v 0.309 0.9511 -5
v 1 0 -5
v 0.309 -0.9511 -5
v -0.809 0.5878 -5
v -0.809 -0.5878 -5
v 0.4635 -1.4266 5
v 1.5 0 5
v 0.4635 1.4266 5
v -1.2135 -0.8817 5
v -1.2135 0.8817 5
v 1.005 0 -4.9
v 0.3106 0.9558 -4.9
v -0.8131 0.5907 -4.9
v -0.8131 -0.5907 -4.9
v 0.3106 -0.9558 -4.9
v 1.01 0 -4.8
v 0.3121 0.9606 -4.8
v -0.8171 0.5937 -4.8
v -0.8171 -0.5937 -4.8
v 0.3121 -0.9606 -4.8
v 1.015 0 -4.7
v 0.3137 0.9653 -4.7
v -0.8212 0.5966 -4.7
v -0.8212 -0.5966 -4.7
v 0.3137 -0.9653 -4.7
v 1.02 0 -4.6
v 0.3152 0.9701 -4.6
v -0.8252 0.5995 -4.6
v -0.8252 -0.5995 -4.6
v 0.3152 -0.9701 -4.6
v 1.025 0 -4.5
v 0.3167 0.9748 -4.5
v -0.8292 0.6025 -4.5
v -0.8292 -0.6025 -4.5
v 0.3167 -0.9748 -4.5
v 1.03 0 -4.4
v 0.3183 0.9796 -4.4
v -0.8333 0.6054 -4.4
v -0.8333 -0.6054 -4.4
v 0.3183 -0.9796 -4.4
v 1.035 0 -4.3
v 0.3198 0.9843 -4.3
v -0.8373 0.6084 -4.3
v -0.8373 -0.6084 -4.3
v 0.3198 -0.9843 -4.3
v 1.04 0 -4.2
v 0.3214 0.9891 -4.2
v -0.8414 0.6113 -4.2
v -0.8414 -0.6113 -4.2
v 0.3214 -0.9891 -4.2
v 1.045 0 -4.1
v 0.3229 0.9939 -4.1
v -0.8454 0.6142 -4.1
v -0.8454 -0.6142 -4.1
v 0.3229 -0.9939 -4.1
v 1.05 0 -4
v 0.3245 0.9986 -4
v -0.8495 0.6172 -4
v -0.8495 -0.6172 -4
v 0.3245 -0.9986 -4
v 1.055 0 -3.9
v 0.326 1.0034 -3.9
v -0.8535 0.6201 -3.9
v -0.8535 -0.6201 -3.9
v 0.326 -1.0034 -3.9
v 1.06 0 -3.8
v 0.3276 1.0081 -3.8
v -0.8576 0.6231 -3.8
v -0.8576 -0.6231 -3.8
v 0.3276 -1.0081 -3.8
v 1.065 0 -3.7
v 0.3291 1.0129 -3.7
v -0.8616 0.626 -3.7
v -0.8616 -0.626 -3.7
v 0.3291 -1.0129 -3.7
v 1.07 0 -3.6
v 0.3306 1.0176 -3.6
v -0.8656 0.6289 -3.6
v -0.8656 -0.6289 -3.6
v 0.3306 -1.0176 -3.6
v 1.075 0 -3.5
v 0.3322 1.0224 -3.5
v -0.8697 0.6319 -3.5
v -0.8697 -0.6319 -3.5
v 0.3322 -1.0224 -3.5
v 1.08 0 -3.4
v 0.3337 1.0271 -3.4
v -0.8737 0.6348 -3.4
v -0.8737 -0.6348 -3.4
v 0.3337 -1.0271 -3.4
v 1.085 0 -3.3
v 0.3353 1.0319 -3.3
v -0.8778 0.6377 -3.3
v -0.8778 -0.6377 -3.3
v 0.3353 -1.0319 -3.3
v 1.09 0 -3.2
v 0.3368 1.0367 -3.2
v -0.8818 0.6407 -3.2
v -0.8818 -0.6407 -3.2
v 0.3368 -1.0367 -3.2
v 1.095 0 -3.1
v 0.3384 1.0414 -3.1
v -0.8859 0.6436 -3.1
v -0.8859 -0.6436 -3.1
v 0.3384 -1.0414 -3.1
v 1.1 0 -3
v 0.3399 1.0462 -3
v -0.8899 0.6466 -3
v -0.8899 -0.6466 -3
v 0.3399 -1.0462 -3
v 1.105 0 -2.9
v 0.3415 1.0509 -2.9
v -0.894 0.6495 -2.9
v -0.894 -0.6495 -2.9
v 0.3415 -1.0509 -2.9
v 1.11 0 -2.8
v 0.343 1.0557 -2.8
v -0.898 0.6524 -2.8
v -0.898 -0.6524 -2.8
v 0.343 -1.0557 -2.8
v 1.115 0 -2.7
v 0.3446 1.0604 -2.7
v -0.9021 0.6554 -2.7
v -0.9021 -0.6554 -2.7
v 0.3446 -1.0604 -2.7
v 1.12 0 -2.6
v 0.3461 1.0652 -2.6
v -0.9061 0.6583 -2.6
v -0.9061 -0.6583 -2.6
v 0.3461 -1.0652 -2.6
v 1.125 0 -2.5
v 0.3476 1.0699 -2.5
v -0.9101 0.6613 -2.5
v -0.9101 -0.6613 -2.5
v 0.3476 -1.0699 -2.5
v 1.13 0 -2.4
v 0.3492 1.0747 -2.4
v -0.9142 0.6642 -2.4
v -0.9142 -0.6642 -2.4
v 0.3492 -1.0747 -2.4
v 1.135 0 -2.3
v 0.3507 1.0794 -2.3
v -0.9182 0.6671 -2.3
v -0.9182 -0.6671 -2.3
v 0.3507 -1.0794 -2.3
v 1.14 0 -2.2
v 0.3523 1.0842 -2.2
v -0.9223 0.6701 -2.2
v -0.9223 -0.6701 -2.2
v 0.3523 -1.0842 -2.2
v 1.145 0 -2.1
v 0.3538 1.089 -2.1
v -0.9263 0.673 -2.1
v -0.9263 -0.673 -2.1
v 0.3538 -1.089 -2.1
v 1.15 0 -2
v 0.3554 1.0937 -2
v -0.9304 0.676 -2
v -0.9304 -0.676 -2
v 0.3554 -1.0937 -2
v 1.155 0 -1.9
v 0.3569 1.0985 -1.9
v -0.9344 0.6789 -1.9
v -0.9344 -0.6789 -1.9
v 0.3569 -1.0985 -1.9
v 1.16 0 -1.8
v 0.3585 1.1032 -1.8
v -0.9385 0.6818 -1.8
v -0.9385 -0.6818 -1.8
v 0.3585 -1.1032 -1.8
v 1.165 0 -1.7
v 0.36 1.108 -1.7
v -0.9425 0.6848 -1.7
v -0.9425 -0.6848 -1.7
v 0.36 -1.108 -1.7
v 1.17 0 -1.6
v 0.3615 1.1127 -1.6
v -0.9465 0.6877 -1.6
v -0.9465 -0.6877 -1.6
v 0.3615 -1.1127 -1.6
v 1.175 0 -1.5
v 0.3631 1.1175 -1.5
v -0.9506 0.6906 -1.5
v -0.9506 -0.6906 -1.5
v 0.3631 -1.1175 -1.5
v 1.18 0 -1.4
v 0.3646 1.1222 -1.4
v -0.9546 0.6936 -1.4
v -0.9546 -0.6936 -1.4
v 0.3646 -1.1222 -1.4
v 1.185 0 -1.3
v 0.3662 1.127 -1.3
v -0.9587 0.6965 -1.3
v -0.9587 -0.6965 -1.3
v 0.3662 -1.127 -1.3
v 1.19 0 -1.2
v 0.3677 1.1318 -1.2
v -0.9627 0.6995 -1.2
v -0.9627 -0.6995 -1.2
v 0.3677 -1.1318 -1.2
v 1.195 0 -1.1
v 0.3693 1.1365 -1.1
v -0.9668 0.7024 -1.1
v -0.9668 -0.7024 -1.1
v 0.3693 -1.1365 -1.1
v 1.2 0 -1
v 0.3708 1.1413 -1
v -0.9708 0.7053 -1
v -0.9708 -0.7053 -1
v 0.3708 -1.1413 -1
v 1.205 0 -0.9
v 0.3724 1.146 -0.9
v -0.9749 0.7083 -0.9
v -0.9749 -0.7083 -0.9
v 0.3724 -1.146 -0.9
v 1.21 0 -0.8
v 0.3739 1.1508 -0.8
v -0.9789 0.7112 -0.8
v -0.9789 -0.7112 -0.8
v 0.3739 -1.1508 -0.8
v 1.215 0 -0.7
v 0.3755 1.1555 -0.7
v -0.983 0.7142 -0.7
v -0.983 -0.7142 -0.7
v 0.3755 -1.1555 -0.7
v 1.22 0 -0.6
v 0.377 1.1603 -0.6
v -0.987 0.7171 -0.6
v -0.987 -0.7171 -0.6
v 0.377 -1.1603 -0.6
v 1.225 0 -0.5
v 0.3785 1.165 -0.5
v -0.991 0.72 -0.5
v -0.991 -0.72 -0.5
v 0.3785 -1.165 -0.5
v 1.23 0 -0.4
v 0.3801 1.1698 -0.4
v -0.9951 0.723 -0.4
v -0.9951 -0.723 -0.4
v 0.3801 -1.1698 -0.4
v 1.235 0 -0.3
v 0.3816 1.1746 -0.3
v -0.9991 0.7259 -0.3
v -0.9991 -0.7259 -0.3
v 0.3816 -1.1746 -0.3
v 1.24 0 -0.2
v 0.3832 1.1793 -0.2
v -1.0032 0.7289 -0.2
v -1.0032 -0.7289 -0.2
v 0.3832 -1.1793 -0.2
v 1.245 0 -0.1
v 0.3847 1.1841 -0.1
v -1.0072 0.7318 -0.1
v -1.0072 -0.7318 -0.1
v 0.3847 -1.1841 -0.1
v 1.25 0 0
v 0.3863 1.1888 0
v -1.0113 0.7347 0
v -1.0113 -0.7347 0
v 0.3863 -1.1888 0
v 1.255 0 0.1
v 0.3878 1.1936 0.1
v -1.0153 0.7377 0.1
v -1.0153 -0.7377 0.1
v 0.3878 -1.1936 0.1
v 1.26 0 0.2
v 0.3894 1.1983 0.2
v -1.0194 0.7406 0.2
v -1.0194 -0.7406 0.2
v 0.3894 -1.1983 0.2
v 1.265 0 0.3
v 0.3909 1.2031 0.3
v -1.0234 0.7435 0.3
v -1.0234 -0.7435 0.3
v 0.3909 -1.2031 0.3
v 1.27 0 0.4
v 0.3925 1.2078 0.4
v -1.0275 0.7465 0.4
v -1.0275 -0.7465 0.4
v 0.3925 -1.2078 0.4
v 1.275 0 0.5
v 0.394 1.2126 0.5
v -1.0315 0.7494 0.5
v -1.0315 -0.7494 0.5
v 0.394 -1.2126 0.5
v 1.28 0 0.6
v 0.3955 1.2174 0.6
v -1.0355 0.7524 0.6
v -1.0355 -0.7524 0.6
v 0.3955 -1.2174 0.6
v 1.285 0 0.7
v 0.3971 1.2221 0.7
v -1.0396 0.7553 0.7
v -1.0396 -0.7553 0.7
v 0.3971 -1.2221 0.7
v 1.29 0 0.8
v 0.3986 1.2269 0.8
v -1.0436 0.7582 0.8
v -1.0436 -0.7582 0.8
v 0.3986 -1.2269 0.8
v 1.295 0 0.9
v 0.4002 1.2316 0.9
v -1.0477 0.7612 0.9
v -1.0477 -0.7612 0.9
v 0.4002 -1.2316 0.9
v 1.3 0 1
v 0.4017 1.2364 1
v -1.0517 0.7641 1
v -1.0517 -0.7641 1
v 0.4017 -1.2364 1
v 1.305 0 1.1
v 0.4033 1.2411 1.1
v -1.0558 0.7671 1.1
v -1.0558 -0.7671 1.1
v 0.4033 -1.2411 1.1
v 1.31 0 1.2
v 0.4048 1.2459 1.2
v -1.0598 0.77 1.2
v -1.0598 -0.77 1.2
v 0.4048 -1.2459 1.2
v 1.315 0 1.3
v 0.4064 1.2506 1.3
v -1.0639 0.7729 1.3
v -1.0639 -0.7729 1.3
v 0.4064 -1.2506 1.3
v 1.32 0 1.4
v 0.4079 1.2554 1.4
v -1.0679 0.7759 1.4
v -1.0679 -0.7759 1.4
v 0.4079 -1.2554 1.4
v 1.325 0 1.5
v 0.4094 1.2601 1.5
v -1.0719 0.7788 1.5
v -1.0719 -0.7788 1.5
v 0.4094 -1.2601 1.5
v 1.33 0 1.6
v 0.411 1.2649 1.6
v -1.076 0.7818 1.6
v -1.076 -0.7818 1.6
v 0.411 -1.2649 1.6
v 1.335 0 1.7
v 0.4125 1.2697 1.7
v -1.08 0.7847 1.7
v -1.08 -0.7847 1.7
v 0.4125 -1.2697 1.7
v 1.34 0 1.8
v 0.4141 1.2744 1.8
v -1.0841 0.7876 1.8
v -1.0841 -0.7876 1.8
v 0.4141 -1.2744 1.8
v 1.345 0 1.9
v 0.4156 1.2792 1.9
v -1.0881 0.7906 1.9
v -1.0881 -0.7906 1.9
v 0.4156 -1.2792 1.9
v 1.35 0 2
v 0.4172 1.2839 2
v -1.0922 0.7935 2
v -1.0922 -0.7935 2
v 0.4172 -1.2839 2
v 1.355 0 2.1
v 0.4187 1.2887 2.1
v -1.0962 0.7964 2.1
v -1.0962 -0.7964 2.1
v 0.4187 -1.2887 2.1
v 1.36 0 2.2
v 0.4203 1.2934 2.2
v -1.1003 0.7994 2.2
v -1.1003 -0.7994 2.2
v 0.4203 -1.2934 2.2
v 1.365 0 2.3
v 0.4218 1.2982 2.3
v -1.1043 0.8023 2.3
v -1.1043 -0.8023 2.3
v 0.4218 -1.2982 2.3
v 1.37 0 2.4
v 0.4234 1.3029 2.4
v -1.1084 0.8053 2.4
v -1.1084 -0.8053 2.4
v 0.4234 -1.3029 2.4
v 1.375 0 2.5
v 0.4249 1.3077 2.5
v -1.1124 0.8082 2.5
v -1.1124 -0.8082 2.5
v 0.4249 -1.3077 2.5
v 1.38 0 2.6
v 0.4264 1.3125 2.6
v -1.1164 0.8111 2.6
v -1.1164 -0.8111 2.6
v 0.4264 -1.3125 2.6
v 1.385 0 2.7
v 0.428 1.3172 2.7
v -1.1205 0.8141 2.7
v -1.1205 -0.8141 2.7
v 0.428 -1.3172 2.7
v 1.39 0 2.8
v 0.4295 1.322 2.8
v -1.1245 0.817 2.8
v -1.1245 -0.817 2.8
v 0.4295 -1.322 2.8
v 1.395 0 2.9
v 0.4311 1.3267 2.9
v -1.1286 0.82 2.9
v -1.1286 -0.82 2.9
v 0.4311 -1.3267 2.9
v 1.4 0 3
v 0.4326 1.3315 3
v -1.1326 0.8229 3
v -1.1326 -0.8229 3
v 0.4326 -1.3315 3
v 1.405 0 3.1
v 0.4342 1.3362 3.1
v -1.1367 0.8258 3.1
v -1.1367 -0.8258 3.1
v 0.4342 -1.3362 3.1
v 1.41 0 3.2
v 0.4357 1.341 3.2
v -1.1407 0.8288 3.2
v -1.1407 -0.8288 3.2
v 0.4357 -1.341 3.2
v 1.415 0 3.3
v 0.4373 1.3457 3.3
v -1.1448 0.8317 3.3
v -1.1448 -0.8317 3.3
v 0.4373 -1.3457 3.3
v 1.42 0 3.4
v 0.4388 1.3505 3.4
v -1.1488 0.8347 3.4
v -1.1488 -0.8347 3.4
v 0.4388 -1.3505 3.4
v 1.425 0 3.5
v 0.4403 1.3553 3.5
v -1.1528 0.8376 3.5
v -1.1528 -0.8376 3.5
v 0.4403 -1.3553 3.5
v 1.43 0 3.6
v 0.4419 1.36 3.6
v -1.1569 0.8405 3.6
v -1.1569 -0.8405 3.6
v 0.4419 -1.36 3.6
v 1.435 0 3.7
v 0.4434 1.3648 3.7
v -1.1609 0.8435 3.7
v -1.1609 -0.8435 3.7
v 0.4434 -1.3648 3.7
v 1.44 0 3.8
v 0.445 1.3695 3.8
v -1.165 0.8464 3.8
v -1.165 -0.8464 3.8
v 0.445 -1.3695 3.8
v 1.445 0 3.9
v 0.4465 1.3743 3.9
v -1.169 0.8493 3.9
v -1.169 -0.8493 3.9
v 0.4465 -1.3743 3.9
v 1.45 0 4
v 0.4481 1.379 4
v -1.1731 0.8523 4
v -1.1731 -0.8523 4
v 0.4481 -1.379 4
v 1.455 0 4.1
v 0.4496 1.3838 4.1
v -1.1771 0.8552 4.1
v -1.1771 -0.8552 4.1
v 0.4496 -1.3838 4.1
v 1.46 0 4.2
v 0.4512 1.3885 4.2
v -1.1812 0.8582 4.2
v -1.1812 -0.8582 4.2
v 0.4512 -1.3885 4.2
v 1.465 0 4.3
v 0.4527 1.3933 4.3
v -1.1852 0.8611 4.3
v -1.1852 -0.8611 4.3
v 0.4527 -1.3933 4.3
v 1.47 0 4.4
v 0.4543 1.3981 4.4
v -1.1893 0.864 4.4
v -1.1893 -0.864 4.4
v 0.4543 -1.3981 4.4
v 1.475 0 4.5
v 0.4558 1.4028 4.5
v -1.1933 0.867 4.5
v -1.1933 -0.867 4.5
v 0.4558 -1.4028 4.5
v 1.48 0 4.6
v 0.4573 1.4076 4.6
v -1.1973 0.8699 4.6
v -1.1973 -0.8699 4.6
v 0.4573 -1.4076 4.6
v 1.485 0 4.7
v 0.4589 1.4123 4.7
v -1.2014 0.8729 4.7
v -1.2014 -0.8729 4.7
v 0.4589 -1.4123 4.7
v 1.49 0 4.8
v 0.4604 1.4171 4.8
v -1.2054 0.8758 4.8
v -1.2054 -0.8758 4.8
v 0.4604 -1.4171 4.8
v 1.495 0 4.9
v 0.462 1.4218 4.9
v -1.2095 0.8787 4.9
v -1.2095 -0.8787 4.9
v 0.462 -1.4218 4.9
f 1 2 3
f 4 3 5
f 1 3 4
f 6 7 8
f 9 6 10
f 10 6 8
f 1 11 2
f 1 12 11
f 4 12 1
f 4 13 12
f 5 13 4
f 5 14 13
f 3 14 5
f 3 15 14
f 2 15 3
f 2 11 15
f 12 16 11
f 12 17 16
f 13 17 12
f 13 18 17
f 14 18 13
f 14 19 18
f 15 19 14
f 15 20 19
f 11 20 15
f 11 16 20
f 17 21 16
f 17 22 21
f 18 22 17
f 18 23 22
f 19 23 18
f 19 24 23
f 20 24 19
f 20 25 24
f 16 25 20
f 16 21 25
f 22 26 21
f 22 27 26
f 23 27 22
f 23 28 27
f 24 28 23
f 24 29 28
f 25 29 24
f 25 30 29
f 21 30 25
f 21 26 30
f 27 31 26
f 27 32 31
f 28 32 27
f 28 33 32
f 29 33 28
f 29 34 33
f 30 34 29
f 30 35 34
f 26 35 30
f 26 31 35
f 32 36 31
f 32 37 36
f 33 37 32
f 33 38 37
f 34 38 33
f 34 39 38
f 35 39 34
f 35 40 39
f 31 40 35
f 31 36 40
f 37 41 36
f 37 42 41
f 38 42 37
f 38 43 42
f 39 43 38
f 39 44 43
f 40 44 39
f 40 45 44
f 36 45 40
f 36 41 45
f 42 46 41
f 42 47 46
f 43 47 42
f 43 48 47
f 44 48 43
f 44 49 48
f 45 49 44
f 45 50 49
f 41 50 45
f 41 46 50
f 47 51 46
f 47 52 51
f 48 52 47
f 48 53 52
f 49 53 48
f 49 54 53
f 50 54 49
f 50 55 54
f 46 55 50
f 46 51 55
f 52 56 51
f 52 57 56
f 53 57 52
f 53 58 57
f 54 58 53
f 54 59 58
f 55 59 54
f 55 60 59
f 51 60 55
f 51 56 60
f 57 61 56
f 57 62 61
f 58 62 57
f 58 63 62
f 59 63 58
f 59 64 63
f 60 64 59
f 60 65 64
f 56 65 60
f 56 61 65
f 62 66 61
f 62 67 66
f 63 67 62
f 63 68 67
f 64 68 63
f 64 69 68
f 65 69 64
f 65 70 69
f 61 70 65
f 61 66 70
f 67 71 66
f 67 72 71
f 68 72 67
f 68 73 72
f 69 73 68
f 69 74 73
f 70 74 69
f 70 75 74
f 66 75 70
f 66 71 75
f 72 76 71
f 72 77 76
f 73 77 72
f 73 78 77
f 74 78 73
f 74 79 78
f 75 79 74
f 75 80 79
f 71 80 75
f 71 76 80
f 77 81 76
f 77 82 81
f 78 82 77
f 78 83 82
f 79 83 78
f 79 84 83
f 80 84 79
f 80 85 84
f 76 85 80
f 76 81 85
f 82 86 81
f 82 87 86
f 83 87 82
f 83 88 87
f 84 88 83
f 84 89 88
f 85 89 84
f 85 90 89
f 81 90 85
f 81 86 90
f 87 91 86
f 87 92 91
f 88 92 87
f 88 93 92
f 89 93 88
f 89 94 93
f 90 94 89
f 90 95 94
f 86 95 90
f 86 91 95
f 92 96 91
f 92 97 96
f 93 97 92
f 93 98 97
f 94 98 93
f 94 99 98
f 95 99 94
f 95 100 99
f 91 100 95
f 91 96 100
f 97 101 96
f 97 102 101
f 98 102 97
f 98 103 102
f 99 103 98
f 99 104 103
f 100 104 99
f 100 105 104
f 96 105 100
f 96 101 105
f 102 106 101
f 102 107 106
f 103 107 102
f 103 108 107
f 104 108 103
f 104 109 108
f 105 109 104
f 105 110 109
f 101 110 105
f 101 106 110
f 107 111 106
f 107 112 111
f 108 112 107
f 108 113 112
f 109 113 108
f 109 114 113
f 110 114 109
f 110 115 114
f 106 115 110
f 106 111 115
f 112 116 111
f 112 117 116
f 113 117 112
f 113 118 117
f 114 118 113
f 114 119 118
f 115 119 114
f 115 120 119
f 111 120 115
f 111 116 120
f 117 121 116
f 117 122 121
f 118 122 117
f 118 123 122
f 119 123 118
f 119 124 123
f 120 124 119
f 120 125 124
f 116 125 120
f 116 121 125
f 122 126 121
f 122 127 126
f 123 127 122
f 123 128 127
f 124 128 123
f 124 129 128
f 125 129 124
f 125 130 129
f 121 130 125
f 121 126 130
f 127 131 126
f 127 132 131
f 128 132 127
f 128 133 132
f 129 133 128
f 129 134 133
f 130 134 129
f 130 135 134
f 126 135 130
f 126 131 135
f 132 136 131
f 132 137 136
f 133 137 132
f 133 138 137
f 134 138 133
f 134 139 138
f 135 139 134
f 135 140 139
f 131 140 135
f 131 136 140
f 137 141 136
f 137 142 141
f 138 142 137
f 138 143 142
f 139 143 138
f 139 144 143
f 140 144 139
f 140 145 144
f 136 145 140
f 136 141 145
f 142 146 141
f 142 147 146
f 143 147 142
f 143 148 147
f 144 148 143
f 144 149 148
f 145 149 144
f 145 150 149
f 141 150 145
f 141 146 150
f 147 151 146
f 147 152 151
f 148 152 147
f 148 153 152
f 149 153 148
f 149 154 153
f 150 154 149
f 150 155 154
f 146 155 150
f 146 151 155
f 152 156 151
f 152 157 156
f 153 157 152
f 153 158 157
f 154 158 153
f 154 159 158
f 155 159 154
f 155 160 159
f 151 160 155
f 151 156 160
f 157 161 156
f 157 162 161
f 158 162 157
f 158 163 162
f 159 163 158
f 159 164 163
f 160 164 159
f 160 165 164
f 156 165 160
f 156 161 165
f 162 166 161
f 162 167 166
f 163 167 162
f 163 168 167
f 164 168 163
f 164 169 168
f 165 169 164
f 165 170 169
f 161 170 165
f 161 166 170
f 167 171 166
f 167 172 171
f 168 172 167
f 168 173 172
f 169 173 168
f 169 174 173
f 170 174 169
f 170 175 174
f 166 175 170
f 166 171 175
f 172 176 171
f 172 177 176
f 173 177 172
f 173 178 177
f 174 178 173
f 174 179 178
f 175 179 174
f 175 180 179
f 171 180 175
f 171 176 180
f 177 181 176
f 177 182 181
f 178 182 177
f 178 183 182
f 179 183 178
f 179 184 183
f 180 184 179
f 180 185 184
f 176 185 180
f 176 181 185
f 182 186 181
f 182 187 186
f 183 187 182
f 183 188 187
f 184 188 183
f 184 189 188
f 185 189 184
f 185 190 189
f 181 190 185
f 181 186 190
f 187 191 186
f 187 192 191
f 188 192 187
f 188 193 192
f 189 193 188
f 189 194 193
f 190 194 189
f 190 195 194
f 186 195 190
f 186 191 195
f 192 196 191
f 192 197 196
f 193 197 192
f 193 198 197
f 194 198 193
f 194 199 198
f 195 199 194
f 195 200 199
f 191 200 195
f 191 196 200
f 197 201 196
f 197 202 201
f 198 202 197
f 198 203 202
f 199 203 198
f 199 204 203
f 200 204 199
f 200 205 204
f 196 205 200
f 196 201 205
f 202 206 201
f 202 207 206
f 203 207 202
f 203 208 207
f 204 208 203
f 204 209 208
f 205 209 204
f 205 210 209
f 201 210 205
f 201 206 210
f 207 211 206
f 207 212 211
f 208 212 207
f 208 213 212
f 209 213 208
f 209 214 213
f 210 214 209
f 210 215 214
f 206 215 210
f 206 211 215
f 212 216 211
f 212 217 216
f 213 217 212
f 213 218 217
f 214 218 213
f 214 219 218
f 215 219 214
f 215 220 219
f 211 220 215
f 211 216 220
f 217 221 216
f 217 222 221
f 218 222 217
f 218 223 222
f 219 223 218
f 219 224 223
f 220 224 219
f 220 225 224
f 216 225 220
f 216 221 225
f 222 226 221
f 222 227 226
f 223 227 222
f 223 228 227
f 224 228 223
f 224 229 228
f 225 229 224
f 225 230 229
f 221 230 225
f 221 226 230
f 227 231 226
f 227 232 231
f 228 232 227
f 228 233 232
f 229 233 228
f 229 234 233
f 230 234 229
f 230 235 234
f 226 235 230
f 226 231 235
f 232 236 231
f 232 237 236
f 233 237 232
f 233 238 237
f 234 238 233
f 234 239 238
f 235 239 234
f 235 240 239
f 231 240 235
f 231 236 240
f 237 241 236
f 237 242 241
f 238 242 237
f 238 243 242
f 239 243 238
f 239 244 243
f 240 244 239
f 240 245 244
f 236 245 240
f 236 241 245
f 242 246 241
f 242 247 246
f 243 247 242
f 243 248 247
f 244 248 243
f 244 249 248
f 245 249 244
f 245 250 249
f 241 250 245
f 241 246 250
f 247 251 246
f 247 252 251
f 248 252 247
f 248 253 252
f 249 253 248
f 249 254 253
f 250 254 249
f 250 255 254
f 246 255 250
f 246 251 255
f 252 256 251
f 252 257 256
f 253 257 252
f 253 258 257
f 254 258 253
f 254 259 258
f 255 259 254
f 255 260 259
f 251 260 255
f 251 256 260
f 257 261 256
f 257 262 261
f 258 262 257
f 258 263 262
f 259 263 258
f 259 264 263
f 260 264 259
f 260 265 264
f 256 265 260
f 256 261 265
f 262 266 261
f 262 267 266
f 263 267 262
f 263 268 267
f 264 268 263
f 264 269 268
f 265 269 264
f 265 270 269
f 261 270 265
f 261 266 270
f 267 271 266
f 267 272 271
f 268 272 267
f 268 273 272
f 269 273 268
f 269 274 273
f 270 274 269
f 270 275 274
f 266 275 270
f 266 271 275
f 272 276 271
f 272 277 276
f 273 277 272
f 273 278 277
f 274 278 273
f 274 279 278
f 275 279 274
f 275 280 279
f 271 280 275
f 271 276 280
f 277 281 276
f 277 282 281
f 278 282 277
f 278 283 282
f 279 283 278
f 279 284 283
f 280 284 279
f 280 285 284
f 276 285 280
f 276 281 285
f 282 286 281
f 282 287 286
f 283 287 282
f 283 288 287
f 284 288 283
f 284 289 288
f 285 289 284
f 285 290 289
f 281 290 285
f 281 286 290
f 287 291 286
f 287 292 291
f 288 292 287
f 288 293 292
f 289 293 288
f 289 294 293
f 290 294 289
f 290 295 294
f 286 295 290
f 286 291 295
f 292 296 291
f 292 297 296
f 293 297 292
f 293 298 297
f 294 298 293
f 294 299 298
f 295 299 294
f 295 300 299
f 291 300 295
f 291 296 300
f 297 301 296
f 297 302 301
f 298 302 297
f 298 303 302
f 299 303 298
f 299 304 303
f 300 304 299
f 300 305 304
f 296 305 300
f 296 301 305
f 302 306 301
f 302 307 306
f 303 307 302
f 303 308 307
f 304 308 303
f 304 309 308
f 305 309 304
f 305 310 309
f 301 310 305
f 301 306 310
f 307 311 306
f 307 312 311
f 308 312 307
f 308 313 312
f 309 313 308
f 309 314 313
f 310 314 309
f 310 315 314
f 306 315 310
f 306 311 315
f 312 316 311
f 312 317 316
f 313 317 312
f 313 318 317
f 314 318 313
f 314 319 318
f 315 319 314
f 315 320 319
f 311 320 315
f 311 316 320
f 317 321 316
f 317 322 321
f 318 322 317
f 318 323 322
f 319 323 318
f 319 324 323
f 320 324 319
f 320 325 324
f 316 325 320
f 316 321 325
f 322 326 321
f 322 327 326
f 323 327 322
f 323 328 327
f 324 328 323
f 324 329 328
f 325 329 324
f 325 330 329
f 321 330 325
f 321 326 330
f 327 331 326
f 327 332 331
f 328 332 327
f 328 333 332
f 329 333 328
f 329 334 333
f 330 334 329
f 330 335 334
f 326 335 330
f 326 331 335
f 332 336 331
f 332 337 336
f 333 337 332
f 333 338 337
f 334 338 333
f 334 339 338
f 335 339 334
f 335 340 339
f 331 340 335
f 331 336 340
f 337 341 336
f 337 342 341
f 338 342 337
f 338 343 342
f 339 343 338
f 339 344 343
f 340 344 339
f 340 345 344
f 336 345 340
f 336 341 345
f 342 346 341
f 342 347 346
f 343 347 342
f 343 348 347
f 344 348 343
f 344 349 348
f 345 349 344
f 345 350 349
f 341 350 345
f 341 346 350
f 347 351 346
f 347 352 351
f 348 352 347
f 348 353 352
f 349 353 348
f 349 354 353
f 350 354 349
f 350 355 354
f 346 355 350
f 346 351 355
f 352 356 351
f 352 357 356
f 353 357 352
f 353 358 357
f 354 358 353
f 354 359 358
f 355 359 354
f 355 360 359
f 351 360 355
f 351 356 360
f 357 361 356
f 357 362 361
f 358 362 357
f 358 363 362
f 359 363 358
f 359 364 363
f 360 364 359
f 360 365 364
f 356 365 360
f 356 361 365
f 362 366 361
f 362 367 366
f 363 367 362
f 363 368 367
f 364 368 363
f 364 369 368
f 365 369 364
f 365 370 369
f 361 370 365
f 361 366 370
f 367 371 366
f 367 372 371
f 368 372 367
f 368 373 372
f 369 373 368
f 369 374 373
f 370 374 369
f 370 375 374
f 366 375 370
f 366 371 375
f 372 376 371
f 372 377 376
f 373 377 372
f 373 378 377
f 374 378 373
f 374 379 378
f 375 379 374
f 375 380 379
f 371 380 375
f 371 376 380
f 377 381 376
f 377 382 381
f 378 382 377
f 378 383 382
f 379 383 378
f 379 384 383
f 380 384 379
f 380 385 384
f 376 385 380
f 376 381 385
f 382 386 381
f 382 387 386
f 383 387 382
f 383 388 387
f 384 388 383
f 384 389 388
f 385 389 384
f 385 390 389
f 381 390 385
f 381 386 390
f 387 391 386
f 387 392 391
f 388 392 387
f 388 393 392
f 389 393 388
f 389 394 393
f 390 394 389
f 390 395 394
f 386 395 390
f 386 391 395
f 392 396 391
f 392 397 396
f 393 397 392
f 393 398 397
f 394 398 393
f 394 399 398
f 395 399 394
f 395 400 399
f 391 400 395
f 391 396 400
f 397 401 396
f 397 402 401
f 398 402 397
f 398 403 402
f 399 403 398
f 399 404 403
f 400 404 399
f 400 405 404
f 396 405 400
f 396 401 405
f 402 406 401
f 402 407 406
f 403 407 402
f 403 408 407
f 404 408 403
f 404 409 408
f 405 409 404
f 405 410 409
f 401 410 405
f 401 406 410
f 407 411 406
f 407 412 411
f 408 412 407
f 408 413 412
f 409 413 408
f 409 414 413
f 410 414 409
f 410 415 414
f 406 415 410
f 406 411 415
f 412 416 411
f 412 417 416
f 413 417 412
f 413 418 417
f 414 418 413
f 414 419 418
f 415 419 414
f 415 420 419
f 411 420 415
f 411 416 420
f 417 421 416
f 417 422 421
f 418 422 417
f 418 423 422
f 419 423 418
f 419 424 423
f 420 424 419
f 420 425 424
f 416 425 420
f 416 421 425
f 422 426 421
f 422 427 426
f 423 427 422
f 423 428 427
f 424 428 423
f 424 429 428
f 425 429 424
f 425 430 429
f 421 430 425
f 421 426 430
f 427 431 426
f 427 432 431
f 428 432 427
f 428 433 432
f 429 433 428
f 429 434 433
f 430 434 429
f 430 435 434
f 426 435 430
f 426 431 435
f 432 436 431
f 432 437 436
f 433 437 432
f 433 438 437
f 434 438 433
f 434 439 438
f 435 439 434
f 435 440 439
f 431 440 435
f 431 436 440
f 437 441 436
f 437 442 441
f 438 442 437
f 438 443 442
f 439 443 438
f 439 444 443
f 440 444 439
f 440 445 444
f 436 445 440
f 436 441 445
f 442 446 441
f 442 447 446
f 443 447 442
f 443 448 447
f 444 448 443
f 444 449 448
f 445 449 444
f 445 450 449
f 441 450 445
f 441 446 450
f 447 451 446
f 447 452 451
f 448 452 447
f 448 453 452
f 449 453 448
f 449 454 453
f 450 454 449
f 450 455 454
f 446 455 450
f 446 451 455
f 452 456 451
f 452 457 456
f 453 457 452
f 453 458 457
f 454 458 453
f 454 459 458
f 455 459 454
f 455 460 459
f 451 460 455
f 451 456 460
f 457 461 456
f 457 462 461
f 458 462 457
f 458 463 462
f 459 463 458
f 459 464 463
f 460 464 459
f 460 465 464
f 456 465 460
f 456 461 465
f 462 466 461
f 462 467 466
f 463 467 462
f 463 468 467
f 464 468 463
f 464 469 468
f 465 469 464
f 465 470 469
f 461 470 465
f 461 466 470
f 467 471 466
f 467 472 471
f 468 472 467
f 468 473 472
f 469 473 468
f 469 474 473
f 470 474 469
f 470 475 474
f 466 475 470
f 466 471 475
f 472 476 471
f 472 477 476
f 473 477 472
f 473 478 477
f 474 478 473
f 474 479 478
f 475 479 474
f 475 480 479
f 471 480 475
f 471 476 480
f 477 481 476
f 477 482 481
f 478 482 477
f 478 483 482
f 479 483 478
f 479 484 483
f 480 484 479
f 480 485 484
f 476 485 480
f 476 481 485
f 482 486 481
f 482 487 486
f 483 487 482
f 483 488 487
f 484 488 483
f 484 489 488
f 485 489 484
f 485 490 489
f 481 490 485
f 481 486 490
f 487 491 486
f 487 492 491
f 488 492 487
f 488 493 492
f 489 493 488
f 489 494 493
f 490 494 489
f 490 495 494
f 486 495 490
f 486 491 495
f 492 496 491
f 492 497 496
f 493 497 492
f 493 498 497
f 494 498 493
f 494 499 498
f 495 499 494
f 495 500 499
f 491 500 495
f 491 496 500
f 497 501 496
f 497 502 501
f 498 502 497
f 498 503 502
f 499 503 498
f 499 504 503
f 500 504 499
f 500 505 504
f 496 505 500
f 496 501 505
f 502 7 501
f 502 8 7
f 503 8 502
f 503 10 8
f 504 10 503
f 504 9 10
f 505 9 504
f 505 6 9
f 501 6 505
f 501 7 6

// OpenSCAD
linear_extrude(height = 10, twist = 0, scale = 1.5, center = true, slices = 100)
            {circle ([20], center = true);}
